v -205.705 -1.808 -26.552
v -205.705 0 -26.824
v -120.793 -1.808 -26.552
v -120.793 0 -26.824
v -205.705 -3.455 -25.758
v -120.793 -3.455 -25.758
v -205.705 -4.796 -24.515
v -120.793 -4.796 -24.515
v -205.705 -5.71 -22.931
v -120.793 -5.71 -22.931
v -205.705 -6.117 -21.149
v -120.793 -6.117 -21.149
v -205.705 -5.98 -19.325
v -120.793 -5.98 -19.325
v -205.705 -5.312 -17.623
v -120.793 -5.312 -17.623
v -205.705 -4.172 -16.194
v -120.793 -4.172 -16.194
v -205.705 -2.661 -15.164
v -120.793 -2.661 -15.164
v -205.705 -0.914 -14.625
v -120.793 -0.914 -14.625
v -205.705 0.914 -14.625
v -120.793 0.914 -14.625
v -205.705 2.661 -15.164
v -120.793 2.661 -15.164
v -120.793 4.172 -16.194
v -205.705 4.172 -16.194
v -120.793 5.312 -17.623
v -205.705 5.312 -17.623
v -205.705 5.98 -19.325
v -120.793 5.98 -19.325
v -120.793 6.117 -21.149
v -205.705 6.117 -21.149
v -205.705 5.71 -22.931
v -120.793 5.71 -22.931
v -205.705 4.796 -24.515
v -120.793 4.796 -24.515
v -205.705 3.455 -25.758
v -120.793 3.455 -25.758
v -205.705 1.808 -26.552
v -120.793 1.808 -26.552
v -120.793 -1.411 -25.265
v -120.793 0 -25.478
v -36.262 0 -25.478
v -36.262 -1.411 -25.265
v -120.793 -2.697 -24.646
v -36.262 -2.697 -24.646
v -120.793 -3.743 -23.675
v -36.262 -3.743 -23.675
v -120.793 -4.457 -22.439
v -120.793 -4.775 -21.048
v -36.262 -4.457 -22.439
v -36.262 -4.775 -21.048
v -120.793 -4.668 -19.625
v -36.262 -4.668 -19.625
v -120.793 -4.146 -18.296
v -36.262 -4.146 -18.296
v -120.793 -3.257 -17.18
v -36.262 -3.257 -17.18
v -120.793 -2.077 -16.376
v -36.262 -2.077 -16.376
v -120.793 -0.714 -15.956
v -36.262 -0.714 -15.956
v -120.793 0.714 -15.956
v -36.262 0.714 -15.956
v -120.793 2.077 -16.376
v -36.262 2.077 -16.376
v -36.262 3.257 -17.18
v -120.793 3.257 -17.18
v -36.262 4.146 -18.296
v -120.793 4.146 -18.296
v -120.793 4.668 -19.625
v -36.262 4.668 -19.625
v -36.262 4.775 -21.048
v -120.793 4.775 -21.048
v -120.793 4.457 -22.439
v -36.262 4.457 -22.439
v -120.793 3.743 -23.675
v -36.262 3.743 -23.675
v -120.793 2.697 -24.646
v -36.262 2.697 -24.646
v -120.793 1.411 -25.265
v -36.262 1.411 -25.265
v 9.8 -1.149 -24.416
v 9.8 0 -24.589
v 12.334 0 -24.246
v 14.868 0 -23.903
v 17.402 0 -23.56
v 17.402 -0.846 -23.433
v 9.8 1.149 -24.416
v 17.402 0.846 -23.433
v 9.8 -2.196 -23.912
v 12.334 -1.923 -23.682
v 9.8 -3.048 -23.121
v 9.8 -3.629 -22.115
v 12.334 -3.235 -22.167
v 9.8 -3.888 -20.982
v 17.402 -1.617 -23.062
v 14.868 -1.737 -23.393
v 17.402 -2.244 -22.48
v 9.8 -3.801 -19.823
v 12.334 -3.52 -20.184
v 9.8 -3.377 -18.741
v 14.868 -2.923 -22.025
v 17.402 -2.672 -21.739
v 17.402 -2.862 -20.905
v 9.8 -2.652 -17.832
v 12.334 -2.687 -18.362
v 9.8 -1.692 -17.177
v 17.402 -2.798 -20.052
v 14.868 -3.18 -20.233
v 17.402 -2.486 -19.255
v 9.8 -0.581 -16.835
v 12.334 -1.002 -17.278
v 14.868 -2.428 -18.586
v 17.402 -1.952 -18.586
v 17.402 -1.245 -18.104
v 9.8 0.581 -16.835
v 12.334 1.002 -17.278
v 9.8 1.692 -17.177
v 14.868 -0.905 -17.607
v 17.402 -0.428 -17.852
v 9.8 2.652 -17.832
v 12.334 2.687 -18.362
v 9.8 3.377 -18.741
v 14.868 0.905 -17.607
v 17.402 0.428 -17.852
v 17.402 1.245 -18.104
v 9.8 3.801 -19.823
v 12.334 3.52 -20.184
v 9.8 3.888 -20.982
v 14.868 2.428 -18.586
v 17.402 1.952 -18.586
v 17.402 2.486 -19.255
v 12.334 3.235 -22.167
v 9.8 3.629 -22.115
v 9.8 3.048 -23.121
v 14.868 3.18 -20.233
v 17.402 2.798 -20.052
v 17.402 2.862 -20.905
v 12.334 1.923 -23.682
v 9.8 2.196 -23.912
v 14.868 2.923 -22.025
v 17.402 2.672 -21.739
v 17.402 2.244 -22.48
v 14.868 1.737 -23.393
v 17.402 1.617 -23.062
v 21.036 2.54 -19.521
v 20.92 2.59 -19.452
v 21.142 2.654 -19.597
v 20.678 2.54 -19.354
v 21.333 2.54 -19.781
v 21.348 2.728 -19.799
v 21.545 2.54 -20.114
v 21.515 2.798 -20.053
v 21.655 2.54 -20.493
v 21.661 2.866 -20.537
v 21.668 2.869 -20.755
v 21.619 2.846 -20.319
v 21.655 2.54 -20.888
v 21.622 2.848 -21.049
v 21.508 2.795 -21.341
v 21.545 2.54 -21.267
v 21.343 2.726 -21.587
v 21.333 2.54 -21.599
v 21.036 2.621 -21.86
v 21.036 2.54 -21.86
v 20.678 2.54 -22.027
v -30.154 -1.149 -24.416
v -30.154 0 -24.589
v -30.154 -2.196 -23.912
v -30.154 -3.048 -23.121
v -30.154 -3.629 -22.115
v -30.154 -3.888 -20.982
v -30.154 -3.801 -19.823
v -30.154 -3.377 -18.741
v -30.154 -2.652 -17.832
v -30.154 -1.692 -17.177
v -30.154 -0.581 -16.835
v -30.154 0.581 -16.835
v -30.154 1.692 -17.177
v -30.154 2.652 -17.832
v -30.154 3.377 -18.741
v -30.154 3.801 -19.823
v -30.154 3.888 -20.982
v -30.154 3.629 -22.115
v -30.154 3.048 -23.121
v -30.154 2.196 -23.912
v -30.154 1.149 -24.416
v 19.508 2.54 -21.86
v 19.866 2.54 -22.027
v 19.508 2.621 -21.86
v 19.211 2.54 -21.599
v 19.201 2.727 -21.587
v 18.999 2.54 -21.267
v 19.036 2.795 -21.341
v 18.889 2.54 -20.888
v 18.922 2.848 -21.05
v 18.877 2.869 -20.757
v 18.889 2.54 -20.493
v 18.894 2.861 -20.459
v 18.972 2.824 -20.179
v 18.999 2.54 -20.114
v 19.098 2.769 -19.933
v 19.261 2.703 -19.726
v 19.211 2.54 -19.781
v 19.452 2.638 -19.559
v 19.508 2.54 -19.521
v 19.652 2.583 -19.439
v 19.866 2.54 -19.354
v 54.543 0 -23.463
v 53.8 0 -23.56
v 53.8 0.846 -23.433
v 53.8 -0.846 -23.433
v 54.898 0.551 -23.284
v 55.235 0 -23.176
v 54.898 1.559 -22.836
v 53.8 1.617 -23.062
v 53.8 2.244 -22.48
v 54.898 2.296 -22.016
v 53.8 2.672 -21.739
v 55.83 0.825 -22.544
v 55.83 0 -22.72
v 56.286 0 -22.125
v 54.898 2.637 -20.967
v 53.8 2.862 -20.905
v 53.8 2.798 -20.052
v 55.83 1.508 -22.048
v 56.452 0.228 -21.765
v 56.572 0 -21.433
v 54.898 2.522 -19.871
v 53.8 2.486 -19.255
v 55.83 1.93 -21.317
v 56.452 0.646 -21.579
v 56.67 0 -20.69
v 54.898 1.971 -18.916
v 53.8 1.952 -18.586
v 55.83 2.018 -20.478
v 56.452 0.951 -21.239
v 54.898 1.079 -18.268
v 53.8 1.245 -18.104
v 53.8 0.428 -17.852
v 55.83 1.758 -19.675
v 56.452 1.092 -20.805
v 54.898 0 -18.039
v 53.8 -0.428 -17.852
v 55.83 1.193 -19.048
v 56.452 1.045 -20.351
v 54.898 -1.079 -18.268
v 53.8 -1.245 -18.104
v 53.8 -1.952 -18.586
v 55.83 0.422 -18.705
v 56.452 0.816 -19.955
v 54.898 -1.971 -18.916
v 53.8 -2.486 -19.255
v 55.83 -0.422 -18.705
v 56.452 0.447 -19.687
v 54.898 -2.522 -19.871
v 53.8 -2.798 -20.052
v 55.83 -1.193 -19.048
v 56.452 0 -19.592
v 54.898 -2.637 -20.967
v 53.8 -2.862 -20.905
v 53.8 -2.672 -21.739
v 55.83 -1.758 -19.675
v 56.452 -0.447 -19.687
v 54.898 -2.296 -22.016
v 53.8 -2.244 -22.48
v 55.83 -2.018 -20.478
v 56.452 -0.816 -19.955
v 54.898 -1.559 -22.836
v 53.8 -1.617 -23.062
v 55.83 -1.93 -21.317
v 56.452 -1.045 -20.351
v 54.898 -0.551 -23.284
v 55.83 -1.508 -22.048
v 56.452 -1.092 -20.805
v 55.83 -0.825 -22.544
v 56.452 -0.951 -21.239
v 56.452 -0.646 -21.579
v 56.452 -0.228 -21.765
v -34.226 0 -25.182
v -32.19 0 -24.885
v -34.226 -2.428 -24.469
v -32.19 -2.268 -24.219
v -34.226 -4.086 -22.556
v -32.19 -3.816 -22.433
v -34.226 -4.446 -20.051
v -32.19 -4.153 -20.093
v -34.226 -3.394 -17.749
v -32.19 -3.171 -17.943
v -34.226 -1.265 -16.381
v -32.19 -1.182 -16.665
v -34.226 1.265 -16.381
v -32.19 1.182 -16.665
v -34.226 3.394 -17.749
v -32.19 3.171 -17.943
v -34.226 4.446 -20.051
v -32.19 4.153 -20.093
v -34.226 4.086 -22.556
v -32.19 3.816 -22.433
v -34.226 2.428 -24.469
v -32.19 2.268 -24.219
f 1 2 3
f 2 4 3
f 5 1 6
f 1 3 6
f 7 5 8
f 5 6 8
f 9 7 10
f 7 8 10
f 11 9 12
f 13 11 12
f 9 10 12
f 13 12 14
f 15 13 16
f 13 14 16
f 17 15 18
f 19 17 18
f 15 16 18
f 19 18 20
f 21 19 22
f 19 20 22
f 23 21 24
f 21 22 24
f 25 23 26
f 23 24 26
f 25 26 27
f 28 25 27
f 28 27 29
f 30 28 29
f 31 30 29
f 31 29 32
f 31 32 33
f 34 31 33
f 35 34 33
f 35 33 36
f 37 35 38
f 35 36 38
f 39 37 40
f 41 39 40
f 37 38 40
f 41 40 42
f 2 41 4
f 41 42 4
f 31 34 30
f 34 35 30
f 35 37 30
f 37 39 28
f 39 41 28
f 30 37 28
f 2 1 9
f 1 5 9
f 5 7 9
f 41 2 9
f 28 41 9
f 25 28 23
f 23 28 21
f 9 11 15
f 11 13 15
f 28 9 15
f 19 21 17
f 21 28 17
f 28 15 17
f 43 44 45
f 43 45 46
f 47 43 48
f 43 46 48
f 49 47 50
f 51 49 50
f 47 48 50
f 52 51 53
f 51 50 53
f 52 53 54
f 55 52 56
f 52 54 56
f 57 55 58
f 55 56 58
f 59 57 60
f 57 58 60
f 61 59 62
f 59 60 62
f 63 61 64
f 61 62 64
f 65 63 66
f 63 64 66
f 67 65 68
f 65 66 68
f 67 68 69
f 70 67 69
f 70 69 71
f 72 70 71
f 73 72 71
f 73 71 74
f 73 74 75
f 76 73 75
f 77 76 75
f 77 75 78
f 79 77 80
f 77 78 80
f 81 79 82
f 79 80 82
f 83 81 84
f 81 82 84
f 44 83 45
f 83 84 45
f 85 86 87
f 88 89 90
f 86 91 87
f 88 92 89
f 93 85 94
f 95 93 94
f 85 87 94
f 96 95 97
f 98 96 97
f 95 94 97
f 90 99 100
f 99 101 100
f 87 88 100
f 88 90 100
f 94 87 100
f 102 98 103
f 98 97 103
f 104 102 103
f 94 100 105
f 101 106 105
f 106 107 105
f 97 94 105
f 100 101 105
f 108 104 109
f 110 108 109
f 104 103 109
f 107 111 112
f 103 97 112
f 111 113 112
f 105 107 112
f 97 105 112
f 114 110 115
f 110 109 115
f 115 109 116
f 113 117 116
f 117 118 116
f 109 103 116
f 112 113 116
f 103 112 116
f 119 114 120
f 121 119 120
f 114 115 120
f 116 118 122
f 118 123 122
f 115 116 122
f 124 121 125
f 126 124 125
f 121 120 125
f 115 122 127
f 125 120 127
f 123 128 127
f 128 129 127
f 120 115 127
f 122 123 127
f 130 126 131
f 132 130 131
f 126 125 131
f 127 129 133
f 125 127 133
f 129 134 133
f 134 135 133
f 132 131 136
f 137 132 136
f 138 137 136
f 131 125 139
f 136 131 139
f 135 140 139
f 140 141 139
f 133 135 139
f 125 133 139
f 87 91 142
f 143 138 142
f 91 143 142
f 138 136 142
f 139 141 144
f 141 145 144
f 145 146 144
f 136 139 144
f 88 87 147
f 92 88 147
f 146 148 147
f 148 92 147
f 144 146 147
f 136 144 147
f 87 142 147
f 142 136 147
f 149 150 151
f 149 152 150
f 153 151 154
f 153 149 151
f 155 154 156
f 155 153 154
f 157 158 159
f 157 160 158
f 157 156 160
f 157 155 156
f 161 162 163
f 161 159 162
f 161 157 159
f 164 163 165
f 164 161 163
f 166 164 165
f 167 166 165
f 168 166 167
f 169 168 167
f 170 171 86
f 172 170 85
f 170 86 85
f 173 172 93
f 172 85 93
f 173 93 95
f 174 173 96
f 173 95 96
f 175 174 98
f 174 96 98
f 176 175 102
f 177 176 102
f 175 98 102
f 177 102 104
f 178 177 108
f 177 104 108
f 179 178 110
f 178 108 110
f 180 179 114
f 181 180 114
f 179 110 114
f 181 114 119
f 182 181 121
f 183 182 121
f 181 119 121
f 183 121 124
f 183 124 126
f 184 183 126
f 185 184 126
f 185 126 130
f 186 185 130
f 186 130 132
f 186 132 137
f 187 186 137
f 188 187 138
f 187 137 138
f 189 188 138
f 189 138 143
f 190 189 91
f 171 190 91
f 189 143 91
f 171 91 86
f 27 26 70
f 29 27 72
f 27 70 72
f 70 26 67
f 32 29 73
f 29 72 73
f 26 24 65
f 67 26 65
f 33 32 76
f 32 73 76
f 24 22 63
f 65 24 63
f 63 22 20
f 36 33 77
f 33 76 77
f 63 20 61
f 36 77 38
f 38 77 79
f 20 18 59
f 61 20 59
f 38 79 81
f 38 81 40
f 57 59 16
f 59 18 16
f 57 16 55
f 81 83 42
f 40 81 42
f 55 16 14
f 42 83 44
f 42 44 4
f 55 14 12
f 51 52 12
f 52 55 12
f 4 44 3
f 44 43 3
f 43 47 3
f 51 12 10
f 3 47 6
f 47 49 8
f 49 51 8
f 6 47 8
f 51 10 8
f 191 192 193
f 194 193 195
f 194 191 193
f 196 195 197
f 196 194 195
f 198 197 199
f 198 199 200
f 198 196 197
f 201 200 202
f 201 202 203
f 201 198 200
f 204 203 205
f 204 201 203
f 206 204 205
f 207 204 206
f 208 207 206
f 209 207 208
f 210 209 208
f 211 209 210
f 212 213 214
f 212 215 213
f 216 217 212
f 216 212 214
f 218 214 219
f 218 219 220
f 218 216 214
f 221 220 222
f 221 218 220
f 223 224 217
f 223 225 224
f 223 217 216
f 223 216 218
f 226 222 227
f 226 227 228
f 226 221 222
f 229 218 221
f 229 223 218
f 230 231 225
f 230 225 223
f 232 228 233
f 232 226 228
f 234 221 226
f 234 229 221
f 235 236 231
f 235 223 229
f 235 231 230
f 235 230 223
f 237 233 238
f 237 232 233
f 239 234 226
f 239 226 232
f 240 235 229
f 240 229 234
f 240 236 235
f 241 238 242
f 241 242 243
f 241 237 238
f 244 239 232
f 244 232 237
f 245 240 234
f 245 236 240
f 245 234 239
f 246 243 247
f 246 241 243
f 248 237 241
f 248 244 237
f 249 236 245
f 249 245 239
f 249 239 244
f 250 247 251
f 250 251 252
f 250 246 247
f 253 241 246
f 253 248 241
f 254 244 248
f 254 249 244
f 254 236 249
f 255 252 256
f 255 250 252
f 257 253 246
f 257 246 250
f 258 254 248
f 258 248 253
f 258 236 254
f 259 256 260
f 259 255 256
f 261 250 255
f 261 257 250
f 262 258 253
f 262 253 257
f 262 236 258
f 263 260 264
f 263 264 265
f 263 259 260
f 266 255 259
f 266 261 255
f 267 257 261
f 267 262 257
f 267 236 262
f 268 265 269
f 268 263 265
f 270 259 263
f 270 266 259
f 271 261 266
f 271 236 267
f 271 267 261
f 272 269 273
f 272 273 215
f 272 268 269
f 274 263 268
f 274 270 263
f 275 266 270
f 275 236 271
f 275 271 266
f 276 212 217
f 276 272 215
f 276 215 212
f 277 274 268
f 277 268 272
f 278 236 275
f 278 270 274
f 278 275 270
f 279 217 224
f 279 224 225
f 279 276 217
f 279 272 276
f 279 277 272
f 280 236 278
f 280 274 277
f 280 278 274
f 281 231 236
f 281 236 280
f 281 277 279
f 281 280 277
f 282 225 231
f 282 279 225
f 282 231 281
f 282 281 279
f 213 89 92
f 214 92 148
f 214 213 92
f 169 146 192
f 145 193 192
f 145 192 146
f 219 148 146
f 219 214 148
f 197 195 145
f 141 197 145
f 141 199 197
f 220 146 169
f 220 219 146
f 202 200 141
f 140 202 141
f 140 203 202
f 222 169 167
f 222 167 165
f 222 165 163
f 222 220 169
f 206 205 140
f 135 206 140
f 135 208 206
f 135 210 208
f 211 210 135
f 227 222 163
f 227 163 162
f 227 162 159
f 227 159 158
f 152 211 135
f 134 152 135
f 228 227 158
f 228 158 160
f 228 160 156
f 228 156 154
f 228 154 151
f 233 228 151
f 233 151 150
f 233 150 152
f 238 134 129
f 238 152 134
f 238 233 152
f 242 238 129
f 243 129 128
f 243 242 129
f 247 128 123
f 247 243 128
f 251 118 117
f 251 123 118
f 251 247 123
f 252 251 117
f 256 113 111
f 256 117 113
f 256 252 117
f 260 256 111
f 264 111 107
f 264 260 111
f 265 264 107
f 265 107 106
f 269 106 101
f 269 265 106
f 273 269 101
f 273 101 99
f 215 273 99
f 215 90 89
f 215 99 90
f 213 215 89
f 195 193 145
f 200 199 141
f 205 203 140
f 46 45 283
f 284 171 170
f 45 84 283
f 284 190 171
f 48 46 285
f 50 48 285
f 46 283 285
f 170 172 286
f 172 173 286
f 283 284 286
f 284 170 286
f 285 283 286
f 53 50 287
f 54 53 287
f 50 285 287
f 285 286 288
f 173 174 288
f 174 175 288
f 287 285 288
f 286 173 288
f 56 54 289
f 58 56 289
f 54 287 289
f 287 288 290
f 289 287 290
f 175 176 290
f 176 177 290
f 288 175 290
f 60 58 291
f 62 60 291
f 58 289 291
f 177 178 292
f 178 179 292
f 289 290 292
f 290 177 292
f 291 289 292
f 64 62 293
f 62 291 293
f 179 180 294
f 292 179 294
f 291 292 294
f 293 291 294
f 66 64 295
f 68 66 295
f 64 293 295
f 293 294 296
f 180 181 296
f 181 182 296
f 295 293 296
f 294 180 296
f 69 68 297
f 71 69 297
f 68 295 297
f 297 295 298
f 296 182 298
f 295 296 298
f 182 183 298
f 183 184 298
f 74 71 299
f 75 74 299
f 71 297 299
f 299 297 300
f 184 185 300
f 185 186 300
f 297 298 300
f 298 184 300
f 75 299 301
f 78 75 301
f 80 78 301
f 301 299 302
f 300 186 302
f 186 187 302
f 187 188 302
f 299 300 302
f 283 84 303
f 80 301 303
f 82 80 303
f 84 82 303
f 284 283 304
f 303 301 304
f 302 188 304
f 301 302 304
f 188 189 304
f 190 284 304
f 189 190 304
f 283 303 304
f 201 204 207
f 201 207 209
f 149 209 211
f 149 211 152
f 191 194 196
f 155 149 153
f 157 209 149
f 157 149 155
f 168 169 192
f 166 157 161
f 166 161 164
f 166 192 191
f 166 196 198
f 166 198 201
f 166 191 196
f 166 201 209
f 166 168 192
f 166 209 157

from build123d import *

# Parameters (mm, degrees)
BOSS_EXTRUDE1_START = 2.8702
SKETCH3_R           = 2.8702
BOSS_EXTRUDE1_DEPTH = 2.8702
FILLET1_R           = 2.8702
CUT_EXTRUDE1_START  = 2.54
SKETCH4_R           = 1.397
CUT_EXTRUDE1_DEPTH  = 2.54


with BuildPart() as part:
    # Sketch1 → Revolve1 (revolve)
    with BuildSketch(Plane(origin=(0, 0, 0), x_dir=(1, 0, 0), z_dir=(0, 1, 0))):
        Polygon((-36.261655476, 25.478138479), (-30.153813644, 24.589138479), (9.800386356, 24.589138479), (17.401896005, 23.560438479), (53.800096005, 23.560438479), (53.800096005, 20.690238479), (-205.705055476, 20.690238479), (-205.705055476, 26.824338479), (-120.792855476, 26.824338479), (-120.792855476, 25.478138479), align=None)
    revolve(axis=Axis((53.800096005, 0, -20.690238479), (-1, 0, 0)))

    # Sketch3 → Boss-Extrude1 (add)
    with BuildSketch(Plane(origin=(53.800096005, 0, 0), x_dir=(0, 0, -1), z_dir=(1, 0, 0)).offset(BOSS_EXTRUDE1_START)):
        with Locations((20.690238479, 0)):
            Circle(SKETCH3_R)
    extrude(amount=-BOSS_EXTRUDE1_DEPTH)

    # Fillet1
    fillet1_edges = [part.edges().sort_by_distance(p)[0] for p in [
        (56.670296005, 0, -17.820038479),
    ]]
    fillet(fillet1_edges, radius=FILLET1_R)

    # Sketch4 → Cut-Extrude1 (cut)
    with BuildSketch(Plane(origin=(0, 0, 0), x_dir=(1, 0, 0), z_dir=(0, 1, 0)).offset(CUT_EXTRUDE1_START)):
        with Locations((20.272096005, 20.690238479)):
            Circle(SKETCH4_R)
    extrude(amount=CUT_EXTRUDE1_DEPTH, mode=Mode.SUBTRACT)


solid = part.part
